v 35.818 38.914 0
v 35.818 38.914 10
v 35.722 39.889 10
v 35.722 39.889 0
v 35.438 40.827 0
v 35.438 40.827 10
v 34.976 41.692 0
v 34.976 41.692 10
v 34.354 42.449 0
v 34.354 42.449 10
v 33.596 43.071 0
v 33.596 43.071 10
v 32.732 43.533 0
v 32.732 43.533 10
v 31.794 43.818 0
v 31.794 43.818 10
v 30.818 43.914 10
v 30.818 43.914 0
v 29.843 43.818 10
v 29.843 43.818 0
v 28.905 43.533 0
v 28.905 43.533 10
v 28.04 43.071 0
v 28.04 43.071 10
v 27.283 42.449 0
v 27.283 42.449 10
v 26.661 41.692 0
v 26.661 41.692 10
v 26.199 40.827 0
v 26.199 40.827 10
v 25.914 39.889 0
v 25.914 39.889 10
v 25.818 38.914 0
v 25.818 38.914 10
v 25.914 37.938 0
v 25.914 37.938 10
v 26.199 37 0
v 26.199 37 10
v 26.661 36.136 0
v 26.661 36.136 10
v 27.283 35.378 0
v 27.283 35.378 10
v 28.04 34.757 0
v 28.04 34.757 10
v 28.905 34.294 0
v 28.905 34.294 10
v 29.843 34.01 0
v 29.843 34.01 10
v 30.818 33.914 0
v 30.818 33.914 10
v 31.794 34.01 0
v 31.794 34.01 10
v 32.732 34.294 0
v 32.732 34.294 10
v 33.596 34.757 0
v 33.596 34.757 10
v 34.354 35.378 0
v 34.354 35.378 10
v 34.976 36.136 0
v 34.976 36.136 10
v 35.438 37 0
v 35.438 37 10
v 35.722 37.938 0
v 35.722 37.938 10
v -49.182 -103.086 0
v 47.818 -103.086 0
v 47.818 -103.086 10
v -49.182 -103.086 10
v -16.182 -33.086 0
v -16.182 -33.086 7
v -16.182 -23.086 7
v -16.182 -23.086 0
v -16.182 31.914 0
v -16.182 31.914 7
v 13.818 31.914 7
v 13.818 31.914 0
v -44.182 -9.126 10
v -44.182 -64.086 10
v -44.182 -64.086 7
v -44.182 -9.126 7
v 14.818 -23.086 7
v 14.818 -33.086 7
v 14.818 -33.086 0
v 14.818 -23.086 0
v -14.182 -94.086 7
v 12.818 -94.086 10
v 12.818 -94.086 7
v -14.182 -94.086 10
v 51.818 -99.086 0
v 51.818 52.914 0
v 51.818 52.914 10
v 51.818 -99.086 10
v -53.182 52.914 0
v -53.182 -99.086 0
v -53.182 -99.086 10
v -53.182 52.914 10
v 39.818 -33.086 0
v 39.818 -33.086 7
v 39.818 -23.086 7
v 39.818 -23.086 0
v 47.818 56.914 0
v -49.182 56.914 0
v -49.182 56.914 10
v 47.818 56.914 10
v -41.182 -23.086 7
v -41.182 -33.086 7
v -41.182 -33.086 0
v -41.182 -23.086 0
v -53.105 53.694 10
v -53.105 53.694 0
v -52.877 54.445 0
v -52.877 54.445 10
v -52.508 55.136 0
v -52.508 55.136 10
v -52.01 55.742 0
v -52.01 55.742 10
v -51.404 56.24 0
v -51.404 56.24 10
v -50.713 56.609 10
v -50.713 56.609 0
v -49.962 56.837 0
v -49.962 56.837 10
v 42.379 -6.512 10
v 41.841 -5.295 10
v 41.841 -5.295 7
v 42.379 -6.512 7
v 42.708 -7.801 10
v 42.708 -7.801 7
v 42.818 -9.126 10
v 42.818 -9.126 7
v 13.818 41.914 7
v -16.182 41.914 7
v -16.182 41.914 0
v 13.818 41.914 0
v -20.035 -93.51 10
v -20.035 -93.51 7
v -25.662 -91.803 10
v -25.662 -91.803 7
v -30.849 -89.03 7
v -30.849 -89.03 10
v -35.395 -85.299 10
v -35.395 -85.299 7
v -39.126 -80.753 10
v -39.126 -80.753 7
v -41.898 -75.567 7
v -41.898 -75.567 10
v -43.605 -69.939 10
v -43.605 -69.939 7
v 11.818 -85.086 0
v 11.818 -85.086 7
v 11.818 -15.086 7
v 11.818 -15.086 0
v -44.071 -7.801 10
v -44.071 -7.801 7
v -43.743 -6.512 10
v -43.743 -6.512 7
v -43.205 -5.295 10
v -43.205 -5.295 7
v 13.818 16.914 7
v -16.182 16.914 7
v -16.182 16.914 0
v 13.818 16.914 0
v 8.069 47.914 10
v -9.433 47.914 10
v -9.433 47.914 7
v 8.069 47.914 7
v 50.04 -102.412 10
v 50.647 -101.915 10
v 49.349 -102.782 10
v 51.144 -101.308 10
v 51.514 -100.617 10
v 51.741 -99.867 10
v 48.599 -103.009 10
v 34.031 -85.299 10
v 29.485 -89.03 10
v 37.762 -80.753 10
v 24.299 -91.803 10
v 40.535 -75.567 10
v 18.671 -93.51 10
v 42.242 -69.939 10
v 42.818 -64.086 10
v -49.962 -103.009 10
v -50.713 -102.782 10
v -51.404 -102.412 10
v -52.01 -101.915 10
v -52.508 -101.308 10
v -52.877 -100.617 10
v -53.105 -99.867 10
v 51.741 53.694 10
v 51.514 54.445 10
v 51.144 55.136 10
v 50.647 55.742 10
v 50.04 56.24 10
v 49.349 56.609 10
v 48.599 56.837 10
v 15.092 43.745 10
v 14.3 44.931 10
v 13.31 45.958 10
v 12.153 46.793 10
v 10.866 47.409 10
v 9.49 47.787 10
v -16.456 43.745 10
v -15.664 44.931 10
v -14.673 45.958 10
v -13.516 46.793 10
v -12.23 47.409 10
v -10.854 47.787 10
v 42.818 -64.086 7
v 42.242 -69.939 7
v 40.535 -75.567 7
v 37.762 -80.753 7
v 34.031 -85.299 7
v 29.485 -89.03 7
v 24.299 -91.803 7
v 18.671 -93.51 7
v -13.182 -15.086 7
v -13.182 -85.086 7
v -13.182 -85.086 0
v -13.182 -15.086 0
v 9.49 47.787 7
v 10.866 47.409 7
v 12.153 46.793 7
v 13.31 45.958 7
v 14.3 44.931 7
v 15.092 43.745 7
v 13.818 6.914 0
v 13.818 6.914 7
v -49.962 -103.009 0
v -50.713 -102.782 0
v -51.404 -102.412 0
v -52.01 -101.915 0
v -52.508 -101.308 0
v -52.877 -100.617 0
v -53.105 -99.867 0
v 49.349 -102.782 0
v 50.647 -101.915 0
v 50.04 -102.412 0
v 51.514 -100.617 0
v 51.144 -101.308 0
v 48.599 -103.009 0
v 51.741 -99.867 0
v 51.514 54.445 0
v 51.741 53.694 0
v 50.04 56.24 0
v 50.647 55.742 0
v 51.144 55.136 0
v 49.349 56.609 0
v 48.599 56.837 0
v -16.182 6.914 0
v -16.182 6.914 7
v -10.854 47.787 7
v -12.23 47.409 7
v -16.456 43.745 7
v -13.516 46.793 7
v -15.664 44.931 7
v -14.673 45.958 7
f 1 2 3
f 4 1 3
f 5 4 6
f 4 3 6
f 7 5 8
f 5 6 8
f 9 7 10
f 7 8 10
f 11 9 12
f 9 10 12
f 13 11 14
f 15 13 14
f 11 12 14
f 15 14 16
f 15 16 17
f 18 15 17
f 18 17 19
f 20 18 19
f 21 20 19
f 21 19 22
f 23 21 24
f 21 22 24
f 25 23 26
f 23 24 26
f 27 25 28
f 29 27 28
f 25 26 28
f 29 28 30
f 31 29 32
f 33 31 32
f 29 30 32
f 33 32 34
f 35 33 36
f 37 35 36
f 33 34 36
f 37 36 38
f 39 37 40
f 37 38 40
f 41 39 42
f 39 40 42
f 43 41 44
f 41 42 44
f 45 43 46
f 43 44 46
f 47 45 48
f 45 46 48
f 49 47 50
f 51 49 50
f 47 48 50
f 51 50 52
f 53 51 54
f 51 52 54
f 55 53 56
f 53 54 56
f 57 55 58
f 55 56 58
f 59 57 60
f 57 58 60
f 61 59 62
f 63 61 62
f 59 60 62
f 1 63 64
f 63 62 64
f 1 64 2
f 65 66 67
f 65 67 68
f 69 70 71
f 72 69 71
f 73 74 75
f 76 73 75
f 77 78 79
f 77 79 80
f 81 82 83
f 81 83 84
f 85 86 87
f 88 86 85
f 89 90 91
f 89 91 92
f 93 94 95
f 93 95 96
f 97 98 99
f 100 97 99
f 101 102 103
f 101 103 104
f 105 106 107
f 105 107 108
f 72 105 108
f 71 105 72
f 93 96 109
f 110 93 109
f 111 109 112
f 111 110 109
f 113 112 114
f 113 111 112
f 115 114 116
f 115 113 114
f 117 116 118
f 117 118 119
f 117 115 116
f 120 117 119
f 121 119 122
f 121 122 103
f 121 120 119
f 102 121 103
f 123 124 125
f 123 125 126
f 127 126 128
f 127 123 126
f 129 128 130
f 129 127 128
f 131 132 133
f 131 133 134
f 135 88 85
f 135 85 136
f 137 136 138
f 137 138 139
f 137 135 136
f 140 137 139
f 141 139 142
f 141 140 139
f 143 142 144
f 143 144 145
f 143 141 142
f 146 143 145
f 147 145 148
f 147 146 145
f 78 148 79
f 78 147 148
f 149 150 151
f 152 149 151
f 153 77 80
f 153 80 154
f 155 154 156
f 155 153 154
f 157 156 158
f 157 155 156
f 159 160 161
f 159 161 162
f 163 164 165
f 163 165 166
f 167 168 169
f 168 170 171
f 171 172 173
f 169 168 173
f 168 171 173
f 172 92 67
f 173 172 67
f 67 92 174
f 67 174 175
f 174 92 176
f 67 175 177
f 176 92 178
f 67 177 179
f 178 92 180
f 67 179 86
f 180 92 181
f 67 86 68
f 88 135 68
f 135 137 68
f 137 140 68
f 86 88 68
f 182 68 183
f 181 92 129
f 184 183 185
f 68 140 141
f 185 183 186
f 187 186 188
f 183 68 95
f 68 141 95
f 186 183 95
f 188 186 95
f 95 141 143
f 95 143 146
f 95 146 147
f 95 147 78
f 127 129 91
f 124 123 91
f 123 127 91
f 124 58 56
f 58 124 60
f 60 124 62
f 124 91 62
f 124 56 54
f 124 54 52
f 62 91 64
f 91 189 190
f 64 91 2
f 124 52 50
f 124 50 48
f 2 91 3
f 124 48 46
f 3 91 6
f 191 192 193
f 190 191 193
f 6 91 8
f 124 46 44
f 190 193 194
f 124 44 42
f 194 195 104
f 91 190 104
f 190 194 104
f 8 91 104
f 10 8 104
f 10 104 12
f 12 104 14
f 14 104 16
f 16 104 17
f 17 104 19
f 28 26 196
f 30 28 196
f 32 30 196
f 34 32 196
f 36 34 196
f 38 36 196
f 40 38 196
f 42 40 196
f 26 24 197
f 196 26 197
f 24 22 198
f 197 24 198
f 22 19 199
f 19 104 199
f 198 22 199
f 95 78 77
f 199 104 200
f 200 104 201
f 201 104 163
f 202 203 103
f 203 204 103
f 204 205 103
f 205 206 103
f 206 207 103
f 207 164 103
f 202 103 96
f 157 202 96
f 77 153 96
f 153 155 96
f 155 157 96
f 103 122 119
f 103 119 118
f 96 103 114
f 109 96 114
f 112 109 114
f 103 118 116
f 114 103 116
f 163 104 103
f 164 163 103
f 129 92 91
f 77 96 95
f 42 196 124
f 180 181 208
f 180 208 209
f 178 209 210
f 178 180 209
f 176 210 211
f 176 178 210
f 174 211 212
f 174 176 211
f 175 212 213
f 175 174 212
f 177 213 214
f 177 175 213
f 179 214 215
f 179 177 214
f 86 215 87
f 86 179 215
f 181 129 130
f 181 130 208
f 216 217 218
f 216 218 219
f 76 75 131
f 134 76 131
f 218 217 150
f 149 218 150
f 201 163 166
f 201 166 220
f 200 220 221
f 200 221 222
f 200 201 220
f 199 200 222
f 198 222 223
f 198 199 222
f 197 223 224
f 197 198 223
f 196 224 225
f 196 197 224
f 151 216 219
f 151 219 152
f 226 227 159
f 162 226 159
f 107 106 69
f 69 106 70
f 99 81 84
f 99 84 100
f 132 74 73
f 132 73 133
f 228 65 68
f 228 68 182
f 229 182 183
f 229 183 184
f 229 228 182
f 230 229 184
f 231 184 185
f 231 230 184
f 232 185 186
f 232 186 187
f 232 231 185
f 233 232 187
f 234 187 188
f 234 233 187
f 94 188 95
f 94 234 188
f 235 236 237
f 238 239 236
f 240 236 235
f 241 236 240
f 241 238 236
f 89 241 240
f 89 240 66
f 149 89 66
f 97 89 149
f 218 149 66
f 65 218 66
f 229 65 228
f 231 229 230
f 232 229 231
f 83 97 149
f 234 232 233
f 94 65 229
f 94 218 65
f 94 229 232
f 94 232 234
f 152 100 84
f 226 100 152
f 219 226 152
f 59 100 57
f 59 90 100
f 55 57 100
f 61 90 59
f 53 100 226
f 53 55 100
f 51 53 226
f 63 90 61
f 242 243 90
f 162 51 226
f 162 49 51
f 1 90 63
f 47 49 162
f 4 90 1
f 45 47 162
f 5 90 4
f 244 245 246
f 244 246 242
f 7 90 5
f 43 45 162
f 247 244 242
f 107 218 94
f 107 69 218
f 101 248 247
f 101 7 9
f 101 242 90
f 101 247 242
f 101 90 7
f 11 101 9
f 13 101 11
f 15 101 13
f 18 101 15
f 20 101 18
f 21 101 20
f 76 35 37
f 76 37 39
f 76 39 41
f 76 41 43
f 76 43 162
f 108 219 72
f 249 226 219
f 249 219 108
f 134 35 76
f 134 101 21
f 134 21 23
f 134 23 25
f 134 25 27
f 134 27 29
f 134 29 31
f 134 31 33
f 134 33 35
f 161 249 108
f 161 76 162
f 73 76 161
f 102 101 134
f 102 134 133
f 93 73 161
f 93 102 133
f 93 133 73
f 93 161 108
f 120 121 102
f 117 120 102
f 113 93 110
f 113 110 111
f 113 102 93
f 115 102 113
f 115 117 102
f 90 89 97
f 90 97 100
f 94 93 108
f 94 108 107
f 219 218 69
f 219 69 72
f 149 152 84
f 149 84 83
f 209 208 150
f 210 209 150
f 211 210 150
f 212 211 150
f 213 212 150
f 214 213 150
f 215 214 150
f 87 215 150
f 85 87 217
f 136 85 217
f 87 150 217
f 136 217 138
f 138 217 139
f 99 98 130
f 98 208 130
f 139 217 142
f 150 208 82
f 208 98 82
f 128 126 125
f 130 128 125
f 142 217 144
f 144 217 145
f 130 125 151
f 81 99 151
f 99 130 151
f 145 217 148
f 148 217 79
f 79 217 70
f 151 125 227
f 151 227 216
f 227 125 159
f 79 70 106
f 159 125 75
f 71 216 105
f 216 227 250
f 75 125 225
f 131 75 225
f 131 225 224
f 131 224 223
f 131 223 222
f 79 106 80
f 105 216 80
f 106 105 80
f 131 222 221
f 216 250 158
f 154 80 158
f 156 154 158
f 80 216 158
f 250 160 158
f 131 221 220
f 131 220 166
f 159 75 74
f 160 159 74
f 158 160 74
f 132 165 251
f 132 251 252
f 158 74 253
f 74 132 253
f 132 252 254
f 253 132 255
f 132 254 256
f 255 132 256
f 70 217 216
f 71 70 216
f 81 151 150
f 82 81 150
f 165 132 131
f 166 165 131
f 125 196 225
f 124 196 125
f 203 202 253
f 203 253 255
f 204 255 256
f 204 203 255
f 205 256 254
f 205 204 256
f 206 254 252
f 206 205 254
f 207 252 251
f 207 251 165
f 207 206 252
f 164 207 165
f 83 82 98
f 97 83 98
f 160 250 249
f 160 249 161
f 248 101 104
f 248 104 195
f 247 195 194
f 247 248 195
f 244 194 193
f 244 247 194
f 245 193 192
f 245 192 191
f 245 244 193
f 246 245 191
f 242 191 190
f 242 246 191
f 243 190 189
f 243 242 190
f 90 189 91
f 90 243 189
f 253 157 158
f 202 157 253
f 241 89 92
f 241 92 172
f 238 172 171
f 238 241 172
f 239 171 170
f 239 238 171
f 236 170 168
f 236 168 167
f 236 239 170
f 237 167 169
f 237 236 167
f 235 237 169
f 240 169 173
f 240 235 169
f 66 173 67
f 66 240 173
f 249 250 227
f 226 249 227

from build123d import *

# Parameters (mm, degrees)
BOSS_EXTRUDE1_DEPTH = 10
CUT_EXTRUDE1_DEPTH  = 3
SKETCH4_W           = 30
SKETCH4_H           = 10
SKETCH4_W_2         = 25
SKETCH4_H_2         = 70
CUT_EXTRUDE3_DEPTH  = 7
SKETCH5_R           = 5
CUT_EXTRUDE4_DEPTH  = 10


with BuildPart() as part:
    # Sketch1 → Boss-Extrude1 (new body)
    with BuildSketch(Plane.XY):
        with BuildLine():
            Line((-49.181793273, 56.913856582), (47.818206727, 56.913856582))
            ThreePointArc((47.818206727, 56.913856582), (50.646633852, 55.742283706), (51.818206727, 52.913856582))
            Line((51.818206727, 52.913856582), (51.818206727, -99.086143418))
            ThreePointArc((51.818206727, -99.086143418), (50.646633852, -101.914570543), (47.818206727, -103.086143418))
            Line((47.818206727, -103.086143418), (-49.181793273, -103.086143418))
            ThreePointArc((-49.181793273, -103.086143418), (-52.010220398, -101.914570543), (-53.181793273, -99.086143418))
            Line((-53.181793273, -99.086143418), (-53.181793273, 52.913856582))
            ThreePointArc((-53.181793273, 52.913856582), (-52.010220398, 55.742283706), (-49.181793273, 56.913856582))
        make_face()
    extrude(amount=BOSS_EXTRUDE1_DEPTH)

    # Sketch3 → Cut-Extrude1 (cut)
    with BuildSketch(Plane.XY.offset(10)):
        with BuildLine():
            Line((-9.432728483, 47.913856582), (8.069141937, 47.913856582))
            ThreePointArc((8.069141937, 47.913856582), (12.15285738, 46.793047536), (15.09230652, 43.744673627))
            Line((15.09230652, 43.744673627), (41.84137131, -5.295278488))
            ThreePointArc((41.84137131, -5.295278488), (42.570152182, -7.149395843), (42.818206727, -9.126095533))
            Line((42.818206727, -9.126095533), (42.818206727, -64.086143418))
            ThreePointArc((42.818206727, -64.086143418), (34.031410163, -85.299346854), (12.818206727, -94.086143418))
            Line((12.818206727, -94.086143418), (-14.181793273, -94.086143418))
            ThreePointArc((-14.181793273, -94.086143418), (-35.394996709, -85.299346854), (-44.181793273, -64.086143418))
            Line((-44.181793273, -64.086143418), (-44.181793273, -9.126095533))
            ThreePointArc((-44.181793273, -9.126095533), (-43.933738728, -7.149395843), (-43.204957856, -5.295278488))
            Line((-43.204957856, -5.295278488), (-16.455893066, 43.744673627))
            ThreePointArc((-16.455893066, 43.744673627), (-13.516443926, 46.793047536), (-9.432728483, 47.913856582))
        make_face()
    extrude(amount=-CUT_EXTRUDE1_DEPTH, mode=Mode.SUBTRACT)

    # Sketch4 → Cut-Extrude3 (cut)
    with BuildSketch(Plane.XY.offset(7)):
        with Locations((-1.181793273, 36.913856582)):
            Rectangle(SKETCH4_W, SKETCH4_H)
        with Locations((-1.181793273, 11.913856582)):
            Rectangle(SKETCH4_W, SKETCH4_H)
        with Locations((-28.681793273, -28.086143418)):
            Rectangle(SKETCH4_W_2, SKETCH4_H)
        with Locations((27.318206727, -28.086143418)):
            Rectangle(SKETCH4_W_2, SKETCH4_H)
        with Locations((-0.681793273, -50.086143418)):
            Rectangle(SKETCH4_W_2, SKETCH4_H_2)
    extrude(amount=-CUT_EXTRUDE3_DEPTH, mode=Mode.SUBTRACT)

    # Sketch5 → Cut-Extrude4 (cut)
    with BuildSketch(Plane.XY.offset(10)):
        with Locations((30.818206727, 38.913856582)):
            Circle(SKETCH5_R)
    extrude(amount=-CUT_EXTRUDE4_DEPTH, mode=Mode.SUBTRACT)


solid = part.part
